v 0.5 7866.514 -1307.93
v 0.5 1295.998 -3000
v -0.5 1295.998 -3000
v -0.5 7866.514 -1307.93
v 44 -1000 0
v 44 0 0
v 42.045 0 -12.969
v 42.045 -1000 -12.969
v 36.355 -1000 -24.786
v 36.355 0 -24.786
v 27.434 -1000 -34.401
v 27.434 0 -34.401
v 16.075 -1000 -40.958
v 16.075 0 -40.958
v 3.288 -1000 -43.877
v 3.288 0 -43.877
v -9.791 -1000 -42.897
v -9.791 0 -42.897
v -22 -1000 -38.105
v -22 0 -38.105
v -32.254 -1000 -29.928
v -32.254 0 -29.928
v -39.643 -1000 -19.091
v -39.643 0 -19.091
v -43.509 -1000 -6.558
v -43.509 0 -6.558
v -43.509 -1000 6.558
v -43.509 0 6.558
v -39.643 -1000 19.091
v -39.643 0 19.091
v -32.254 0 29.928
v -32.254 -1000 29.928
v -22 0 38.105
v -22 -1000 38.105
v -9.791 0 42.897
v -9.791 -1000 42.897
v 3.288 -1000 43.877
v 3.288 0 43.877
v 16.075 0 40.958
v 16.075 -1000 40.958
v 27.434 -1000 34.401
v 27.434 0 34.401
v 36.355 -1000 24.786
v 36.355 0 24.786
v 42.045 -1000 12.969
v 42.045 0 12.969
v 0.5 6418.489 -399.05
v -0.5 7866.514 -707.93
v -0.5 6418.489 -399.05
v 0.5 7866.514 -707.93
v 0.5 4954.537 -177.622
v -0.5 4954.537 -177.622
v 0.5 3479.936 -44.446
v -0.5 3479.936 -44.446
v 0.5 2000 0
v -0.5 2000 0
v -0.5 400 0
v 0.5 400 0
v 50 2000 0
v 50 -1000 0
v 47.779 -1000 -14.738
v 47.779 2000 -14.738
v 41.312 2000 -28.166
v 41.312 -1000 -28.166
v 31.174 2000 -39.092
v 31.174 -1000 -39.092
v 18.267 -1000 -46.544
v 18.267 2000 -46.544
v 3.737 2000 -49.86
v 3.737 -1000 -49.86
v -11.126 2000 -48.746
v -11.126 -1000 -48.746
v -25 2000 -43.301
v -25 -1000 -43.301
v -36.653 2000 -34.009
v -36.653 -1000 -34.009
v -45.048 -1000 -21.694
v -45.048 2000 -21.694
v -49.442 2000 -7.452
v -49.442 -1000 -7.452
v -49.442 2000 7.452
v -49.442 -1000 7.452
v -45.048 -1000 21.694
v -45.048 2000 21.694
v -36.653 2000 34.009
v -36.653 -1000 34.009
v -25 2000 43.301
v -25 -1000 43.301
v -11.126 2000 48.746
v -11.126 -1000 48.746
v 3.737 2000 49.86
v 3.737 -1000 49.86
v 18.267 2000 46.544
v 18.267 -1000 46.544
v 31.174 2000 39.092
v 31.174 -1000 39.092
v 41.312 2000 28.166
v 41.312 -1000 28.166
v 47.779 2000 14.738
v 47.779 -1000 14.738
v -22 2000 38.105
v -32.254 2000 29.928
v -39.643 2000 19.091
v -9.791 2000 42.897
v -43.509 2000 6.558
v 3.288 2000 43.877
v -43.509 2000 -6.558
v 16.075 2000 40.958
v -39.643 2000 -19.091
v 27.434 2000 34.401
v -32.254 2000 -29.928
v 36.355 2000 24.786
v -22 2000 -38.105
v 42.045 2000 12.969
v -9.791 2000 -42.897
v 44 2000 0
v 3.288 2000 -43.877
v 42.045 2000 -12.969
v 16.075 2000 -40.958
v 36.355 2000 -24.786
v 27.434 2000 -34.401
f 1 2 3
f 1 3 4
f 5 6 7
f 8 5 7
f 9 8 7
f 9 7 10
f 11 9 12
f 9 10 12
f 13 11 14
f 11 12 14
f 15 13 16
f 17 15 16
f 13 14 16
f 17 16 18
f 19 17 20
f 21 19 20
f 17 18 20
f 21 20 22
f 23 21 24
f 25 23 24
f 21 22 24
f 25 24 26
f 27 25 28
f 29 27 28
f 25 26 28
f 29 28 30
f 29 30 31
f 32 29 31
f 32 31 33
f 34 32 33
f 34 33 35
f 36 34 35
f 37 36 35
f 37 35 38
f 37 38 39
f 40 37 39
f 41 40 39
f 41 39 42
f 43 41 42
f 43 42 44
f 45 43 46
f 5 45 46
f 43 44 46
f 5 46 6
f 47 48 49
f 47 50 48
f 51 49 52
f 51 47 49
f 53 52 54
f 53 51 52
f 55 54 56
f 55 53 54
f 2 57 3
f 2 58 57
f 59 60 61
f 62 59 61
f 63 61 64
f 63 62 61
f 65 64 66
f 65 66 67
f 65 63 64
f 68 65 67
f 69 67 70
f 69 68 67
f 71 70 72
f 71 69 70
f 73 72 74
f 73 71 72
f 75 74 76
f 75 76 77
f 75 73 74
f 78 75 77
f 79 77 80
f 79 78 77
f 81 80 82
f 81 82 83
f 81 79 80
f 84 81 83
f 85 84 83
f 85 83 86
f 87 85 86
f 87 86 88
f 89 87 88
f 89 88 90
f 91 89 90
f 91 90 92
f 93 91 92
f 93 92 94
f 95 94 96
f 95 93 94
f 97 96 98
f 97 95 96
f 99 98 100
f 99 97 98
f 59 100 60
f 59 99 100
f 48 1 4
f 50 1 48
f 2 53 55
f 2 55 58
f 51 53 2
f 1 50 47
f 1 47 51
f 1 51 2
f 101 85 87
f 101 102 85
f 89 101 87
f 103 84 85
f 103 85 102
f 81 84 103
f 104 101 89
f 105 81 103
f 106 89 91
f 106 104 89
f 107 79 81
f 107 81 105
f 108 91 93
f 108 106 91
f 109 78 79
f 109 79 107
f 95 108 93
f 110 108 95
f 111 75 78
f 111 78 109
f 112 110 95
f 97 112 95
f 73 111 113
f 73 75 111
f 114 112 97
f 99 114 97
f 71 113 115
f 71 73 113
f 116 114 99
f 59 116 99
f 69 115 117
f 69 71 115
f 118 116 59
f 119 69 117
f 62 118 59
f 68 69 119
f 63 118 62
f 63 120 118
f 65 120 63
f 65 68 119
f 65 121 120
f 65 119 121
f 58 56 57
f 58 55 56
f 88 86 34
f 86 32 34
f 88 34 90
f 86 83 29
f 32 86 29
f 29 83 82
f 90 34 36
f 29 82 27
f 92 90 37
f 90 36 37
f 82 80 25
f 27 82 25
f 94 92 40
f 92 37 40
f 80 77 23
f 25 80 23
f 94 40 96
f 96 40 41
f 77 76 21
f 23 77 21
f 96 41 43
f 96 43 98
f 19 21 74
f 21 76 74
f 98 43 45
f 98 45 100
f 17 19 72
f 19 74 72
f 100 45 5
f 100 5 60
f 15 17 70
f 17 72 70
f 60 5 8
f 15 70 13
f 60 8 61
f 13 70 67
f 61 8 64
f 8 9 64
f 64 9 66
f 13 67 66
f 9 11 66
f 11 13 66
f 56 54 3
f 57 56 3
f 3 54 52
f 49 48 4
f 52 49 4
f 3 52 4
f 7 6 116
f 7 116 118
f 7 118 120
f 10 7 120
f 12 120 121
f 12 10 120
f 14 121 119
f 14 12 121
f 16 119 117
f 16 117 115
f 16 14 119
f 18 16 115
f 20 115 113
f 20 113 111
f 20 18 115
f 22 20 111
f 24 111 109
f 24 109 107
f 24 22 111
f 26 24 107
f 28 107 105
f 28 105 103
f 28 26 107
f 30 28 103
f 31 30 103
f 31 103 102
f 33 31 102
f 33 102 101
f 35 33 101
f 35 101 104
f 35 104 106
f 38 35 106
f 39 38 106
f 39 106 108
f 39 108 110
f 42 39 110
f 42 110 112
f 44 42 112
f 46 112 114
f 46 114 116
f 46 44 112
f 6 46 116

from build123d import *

# Parameters (mm, degrees)
SKETCH2_R                = 50
SKETCH2_R_2              = 44
BOSS_EXTRUDE1_DEPTH      = 2000
BOSS_EXTRUDE1_DEPTH_BACK = 1000
BOSS_EXTRUDE2_DEPTH      = 0.5


with BuildPart() as part:
    # Sketch2 → Boss-Extrude1 (new body, two sides)
    with BuildSketch(Plane(origin=(0, 0, 0), x_dir=(1, 0, 0), z_dir=(0, 1, 0))) as boss_extrude1_sk:
        Circle(SKETCH2_R)
        Circle(SKETCH2_R_2, mode=Mode.SUBTRACT)
    extrude(amount=BOSS_EXTRUDE1_DEPTH)
    extrude(boss_extrude1_sk.sketch, amount=-BOSS_EXTRUDE1_DEPTH_BACK)


with BuildPart() as body_2:
    # Sketch4 → Boss-Extrude2 (new body, symmetric)
    with BuildSketch(Plane(origin=(0, 0, 0), x_dir=(0, 0, -1), z_dir=(1, 0, 0))):
        with BuildLine():
            Line((0, 400), (3000, 1295.997925735))
            Line((3000, 1295.997925735), (1307.930468861, 7866.514210209))
            Line((1307.930468861, 7866.514210209), (707.930468861, 7866.514210209))
            ThreePointArc((707.930468861, 7866.514210209), (177.622273407, 4954.536957263), (0, 2000))
            Line((0, 2000), (0, 400))
        make_face()
    extrude(amount=BOSS_EXTRUDE2_DEPTH, both=True)


solid = Compound([part.part, body_2.part])
